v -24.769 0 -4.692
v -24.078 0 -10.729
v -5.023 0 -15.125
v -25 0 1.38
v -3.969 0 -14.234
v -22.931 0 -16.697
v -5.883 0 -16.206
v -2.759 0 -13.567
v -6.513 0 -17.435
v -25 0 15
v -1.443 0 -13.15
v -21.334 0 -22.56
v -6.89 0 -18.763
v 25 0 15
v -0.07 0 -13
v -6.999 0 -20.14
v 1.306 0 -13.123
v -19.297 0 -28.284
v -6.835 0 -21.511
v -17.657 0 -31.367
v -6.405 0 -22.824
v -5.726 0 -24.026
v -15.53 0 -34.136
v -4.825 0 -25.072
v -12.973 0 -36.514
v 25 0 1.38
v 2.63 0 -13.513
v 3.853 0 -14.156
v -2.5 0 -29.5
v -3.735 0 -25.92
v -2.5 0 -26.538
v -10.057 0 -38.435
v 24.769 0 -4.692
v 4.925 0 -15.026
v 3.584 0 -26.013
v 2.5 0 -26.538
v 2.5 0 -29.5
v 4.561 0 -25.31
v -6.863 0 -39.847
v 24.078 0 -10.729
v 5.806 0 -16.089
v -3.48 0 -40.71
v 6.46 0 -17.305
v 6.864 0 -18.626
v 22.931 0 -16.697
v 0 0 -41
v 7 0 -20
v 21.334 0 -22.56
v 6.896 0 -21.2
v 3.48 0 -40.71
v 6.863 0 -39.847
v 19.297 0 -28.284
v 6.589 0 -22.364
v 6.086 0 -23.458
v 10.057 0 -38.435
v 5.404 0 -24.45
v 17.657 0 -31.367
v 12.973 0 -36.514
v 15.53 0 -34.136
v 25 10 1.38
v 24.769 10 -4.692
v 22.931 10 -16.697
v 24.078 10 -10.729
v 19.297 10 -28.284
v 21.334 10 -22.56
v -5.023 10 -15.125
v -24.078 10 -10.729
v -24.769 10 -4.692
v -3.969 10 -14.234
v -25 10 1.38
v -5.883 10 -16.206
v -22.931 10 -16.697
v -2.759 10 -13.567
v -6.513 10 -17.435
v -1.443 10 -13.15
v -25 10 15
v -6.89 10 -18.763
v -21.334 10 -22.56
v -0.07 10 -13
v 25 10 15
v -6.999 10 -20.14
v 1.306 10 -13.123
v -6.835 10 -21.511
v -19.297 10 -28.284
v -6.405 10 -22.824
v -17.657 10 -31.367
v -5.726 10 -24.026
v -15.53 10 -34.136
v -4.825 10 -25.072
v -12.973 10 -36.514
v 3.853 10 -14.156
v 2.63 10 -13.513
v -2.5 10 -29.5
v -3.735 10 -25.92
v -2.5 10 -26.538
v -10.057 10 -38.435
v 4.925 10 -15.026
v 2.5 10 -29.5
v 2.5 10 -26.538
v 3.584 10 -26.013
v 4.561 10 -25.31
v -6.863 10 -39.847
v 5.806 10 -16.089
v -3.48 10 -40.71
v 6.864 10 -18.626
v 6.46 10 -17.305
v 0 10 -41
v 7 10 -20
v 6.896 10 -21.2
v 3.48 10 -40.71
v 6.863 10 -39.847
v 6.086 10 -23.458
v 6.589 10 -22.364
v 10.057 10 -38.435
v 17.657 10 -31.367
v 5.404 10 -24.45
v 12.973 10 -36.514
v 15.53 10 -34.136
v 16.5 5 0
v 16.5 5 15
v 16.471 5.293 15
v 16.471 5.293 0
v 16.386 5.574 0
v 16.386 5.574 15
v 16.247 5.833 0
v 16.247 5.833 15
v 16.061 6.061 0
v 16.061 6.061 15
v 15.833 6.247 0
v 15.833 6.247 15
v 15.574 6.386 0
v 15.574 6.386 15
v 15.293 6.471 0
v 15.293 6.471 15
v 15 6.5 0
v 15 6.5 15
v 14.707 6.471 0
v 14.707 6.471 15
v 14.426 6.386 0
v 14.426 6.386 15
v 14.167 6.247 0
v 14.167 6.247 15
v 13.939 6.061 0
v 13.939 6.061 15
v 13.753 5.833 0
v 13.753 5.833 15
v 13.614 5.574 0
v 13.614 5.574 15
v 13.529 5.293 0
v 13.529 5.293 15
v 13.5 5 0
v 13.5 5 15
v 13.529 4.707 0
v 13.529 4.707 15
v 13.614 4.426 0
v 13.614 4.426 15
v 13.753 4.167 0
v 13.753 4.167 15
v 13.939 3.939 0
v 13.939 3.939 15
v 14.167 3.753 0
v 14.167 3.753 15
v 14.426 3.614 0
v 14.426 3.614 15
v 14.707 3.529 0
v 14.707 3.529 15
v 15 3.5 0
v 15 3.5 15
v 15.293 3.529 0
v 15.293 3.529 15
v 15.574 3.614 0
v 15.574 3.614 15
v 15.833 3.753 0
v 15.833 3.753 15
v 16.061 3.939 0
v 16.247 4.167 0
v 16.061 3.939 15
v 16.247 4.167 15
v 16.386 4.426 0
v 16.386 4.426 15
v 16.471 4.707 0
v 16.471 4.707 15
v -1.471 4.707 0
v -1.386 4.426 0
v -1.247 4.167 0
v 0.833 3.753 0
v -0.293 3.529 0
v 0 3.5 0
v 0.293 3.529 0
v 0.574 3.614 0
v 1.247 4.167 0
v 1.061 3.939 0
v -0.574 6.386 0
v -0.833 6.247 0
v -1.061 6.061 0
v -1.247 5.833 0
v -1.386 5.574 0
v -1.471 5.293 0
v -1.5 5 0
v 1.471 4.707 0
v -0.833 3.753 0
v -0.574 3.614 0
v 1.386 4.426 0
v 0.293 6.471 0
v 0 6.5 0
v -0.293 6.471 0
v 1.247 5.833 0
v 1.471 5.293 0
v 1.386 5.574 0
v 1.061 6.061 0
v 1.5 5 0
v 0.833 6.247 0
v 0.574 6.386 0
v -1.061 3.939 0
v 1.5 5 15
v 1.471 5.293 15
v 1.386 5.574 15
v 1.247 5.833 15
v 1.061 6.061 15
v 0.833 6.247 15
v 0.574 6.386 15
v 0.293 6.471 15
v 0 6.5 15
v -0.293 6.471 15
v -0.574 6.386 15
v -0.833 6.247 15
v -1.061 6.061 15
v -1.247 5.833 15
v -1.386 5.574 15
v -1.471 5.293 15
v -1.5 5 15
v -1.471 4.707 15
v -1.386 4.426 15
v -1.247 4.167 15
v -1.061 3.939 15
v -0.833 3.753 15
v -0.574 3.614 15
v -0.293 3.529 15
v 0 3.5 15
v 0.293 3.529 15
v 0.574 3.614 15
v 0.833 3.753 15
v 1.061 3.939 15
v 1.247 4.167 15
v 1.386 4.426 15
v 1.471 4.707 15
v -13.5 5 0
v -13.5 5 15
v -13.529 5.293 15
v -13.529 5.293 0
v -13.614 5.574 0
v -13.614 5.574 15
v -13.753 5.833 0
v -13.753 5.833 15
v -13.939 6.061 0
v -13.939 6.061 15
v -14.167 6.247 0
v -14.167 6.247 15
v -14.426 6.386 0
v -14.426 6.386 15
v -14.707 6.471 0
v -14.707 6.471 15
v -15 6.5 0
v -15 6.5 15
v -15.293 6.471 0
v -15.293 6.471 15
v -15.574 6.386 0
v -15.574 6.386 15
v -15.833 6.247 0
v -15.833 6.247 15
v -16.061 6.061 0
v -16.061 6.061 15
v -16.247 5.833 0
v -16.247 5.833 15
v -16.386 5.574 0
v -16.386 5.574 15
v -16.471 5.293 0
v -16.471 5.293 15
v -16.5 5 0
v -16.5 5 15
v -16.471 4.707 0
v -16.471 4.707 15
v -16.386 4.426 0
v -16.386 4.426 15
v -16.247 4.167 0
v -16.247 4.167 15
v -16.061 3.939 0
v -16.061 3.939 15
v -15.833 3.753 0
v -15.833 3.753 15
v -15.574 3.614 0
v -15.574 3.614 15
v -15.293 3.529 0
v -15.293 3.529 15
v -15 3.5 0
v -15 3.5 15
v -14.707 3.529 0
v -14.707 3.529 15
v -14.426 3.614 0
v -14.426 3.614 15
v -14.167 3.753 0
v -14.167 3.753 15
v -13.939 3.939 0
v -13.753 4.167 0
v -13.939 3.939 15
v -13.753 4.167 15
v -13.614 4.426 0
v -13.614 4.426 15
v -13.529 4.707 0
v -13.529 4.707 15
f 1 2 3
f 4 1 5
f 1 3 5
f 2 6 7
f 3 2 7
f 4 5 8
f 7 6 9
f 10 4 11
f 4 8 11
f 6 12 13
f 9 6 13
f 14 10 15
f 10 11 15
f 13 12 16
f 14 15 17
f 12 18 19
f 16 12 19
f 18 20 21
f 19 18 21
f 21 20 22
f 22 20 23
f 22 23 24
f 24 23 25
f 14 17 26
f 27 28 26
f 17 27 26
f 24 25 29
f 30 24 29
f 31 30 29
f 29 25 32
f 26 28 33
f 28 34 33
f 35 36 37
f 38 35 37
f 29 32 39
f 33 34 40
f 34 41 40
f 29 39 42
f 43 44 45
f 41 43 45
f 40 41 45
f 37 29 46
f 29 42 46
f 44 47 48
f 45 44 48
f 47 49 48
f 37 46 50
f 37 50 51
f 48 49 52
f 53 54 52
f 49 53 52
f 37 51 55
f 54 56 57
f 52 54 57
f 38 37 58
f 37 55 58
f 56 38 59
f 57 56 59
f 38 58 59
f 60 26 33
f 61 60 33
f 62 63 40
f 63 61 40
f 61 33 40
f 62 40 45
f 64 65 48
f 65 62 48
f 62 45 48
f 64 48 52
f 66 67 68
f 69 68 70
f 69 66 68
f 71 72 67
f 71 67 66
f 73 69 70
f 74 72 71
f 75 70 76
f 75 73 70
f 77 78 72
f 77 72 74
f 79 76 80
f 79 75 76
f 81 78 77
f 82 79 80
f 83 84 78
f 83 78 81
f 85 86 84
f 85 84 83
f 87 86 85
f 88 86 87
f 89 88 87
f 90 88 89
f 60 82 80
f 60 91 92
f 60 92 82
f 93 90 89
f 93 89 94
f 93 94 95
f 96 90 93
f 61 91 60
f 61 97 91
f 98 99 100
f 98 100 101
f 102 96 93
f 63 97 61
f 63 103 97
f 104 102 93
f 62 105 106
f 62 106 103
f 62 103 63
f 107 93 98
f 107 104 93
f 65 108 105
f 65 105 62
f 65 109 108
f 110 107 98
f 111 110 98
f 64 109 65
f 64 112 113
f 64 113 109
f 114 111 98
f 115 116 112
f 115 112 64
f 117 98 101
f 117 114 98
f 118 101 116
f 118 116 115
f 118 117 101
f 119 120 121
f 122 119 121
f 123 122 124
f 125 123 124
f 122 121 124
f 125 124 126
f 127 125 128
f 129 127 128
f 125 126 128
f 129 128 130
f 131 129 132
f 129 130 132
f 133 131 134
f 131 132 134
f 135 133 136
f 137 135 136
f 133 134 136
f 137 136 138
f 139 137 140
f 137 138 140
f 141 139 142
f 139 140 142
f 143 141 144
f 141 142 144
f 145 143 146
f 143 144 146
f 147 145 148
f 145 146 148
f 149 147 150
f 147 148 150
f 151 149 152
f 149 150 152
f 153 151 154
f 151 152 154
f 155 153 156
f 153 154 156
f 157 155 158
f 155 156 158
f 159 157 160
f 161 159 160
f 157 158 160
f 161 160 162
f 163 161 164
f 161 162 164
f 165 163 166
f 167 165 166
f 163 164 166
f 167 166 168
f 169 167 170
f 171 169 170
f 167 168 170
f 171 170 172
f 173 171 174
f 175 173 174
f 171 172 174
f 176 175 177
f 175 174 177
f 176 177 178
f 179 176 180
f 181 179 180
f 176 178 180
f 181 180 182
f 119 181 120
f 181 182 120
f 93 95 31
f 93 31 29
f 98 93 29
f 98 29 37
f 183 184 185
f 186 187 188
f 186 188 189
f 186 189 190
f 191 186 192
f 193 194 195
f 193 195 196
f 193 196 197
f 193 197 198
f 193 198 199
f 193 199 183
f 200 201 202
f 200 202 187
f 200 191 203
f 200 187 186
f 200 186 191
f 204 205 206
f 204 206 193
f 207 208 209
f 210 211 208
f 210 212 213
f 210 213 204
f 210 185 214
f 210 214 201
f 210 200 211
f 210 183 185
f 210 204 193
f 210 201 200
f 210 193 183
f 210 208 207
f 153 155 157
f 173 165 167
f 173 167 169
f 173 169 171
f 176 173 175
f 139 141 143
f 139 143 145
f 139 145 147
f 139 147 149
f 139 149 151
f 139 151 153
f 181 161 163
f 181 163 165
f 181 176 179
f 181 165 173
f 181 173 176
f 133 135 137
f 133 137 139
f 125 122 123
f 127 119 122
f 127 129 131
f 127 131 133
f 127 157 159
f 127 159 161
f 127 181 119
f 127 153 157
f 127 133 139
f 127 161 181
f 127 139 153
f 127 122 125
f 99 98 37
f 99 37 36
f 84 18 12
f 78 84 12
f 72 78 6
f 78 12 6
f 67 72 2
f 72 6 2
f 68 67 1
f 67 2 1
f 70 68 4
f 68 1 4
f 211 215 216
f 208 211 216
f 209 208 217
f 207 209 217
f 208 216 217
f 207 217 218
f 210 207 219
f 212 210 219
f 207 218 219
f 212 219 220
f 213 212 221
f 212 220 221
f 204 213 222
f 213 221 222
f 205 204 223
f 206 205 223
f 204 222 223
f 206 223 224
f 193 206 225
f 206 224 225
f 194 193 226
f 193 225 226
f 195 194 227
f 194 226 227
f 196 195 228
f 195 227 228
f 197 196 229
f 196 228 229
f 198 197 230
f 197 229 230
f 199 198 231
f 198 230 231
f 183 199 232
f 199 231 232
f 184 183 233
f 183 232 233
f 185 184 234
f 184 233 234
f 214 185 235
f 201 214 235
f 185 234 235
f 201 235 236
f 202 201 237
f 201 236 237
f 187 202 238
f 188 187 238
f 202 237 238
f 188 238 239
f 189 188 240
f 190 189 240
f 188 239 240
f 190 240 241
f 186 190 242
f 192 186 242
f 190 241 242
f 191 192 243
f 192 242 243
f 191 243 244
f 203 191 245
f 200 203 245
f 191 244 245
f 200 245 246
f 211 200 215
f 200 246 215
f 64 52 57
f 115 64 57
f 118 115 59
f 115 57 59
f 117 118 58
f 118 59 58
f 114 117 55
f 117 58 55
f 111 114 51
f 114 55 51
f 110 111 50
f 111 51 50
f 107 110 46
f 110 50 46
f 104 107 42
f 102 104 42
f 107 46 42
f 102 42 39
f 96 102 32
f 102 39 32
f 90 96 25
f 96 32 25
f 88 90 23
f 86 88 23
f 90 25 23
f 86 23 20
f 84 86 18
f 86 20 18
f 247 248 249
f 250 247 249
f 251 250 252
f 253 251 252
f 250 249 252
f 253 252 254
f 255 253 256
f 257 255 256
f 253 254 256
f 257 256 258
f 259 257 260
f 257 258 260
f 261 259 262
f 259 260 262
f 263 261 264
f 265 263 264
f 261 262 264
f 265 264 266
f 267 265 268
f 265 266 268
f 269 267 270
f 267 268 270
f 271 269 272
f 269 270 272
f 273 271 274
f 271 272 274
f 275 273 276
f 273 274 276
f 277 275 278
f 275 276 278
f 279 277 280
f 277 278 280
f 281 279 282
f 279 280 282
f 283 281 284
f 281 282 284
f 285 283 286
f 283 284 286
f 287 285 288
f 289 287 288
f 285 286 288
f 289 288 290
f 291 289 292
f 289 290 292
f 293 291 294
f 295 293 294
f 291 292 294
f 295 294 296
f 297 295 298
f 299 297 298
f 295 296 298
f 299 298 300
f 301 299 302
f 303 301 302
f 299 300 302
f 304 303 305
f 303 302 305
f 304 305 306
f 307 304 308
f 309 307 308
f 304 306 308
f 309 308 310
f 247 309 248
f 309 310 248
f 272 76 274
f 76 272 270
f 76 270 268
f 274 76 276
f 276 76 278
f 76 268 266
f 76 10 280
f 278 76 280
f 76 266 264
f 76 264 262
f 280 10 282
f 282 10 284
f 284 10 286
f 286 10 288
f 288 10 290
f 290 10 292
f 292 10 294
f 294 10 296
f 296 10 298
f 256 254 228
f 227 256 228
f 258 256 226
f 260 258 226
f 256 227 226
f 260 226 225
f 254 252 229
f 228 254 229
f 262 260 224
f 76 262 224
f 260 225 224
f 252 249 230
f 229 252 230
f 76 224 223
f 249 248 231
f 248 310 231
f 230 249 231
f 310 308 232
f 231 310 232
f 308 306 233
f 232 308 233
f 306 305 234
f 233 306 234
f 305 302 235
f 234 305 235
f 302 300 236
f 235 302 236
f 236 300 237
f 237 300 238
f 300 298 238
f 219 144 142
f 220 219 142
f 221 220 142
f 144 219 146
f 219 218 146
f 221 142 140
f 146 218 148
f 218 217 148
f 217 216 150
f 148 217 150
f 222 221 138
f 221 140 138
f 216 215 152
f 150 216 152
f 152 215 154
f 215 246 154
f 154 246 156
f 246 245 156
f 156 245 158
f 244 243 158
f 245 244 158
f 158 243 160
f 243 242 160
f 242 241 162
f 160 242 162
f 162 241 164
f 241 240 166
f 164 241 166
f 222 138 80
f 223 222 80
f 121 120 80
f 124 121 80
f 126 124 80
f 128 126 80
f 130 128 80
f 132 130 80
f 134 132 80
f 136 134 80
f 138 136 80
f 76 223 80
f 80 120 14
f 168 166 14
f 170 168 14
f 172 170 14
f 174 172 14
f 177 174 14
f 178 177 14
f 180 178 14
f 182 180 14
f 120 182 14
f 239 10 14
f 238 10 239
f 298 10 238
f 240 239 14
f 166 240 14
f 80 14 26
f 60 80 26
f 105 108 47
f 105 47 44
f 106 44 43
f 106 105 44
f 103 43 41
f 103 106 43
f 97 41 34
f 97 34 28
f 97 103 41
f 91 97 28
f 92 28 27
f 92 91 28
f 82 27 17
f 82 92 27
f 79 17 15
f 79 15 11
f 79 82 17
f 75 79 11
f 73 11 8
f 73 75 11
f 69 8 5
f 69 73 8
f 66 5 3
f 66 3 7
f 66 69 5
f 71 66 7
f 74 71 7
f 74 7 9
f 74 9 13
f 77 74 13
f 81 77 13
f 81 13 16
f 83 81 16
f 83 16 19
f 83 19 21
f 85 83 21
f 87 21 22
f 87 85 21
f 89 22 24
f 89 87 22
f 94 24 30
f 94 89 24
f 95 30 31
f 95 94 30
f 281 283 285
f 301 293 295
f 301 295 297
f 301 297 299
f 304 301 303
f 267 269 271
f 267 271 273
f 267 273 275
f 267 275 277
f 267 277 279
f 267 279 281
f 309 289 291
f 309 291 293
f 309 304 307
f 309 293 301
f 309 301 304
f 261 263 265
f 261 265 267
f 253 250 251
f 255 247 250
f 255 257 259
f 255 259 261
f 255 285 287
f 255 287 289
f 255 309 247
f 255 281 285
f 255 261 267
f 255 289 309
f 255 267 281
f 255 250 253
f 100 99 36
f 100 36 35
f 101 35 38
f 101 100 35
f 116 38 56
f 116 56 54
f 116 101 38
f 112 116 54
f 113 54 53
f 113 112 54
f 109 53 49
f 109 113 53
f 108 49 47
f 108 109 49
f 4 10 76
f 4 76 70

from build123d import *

# Parameters (mm, degrees)
CROQUIS1_R              = 21
CROQUIS1_W              = 50
CROQUIS1_H              = 30
SALIENTE_EXTRUIR1_DEPTH = 10
CROQUIS2_R              = 16
CORTAR_EXTRUIR1_DEPTH   = 50.050993874
REDONDEO1_R             = 80
CROQUIS3_R              = 1.5
CORTAR_EXTRUIR2_DEPTH   = 15
MATRIZL1_COUNT          = 2
MATRIZL1_PITCH          = 15
MATRIZL1_COL_COUNT      = 2
MATRIZL1_COL_PITCH      = 15
SKETCH1_R               = 16
BOSS_EXTRUDE1_DEPTH     = 10


with BuildPart() as part:
    # Croquis1 → Saliente-Extruir1 (new body)
    with BuildSketch(Plane(origin=(0, 0, 0), x_dir=(1, 0, 0), z_dir=(0, 1, 0))):
        with Locations((0, 20)):
            Circle(CROQUIS1_R)
        Rectangle(CROQUIS1_W, CROQUIS1_H)
        with BuildLine():
            ThreePointArc((19.296872909, 28.284364546), (0, 41), (-19.296872909, 28.284364546))
            ThreePointArc((-19.296872909, 28.284364546), (-20.928477594, 21.731711756), (-20.396078054, 15))
            Line((-20.396078054, 15), (20.396078054, 15))
            ThreePointArc((20.396078054, 15), (20.848472835, 17.481829944), (21, 20))
            ThreePointArc((21, 20), (20.569811996, 24.228810052), (19.296872909, 28.284364546))
        make_face()
        with BuildLine():
            Line((20.396078054, 15), (-20.396078054, 15))
            ThreePointArc((-20.396078054, 15), (0, -1), (20.396078054, 15))
        make_face()
        with BuildLine():
            Line((25, 15), (19.296872909, 28.284364546))
            ThreePointArc((19.296872909, 28.284364546), (20.569811996, 24.228810052), (21, 20))
            ThreePointArc((21, 20), (20.848472835, 17.481829944), (20.396078054, 15))
            Line((20.396078054, 15), (25, 15))
        make_face()
        with BuildLine():
            Line((-19.296872909, 28.284364546), (-25, 15))
            Line((-25, 15), (-20.396078054, 15))
            ThreePointArc((-20.396078054, 15), (-20.928477594, 21.731711756), (-19.296872909, 28.284364546))
        make_face()
    extrude(amount=SALIENTE_EXTRUIR1_DEPTH)

    # Croquis2 → Cortar-Extruir1 (cut, through all)
    with BuildSketch(Plane(origin=(0, 10, 0), x_dir=(1, 0, 0), z_dir=(0, 1, 0))):
        with Locations(Location((0, 20, 0), (0, 0, 270))):
            Circle(CROQUIS2_R)
    extrude(amount=-CORTAR_EXTRUIR1_DEPTH, mode=Mode.SUBTRACT)

    # Redondeo1
    # the kernel refuses this fillet: 80 mm, written as the material it takes off along each edge
    with BuildSketch(Plane(origin=(25, -40.950006406, -15), x_dir=(-0.39449354980003665, 0, -0.9188987099600074), z_dir=(0, 1, 0))) as redondeo1_piece_1:
        with BuildLine():
            CenterArc((16.50792076, 79.973702153), REDONDEO1_R, 246.765608194, 21.765246915)
            Line((-15.051563224, 6.461805357), (0, 0))
            Line((0, 0), (14.456832295, 0))
        make_face()
    extrude(amount=91.900012811, mode=Mode.SUBTRACT)
    with BuildSketch(Plane(origin=(-25, -40.950006406, -15), x_dir=(0.39449354980003676, 0, -0.9188987099600074), z_dir=(0, 1, 0))) as redondeo1_piece_2:
        with BuildLine():
            CenterArc((16.50792076, -79.973702153), REDONDEO1_R, 91.46914489, 21.765246915)
            Line((-15.051563224, -6.461805357), (0, 0))
            Line((0, 0), (14.456832295, 0))
        make_face()
    extrude(amount=91.900012811, mode=Mode.SUBTRACT)

    # Croquis3 → Cortar-Extruir2 (cut)
    with BuildSketch(Plane.XY.offset(15)):
        with Locations((0, 5)):
            Circle(CROQUIS3_R)
    cortar_extruir2 = extrude(amount=-CORTAR_EXTRUIR2_DEPTH, mode=Mode.SUBTRACT)

    # MatrizL1: Cortar-Extruir2 ×2
    with Locations(*[(i * MATRIZL1_PITCH, 0, 0) for i in range(1, MATRIZL1_COUNT)]):
        add(cortar_extruir2, mode=Mode.SUBTRACT)

    # MatrizL1 col: Cortar-Extruir2 ×2
    with Locations(*[(-i * MATRIZL1_COL_PITCH, 0, 0) for i in range(1, MATRIZL1_COL_COUNT)]):
        add(cortar_extruir2, mode=Mode.SUBTRACT)

    # Sketch1 → Boss-Extrude1 (add)
    with BuildSketch(Plane(origin=(0, 10, 0), x_dir=(1, 0, 0), z_dir=(0, 1, 0))):
        with Locations((0, 20)):
            Circle(SKETCH1_R)
        with BuildLine():
            Line((-2.5, 26.538348415), (-2.5, 29.5))
            Line((-2.5, 29.5), (2.5, 29.5))
            Line((2.5, 29.5), (2.5, 26.538348415))
            ThreePointArc((2.5, 26.538348415), (5.766281297, 23.968626967), (7, 20))
            ThreePointArc((7, 20), (-3.968626967, 14.233718703), (-2.5, 26.538348415))
        make_face(mode=Mode.SUBTRACT)
    extrude(amount=-BOSS_EXTRUDE1_DEPTH)


solid = part.part
